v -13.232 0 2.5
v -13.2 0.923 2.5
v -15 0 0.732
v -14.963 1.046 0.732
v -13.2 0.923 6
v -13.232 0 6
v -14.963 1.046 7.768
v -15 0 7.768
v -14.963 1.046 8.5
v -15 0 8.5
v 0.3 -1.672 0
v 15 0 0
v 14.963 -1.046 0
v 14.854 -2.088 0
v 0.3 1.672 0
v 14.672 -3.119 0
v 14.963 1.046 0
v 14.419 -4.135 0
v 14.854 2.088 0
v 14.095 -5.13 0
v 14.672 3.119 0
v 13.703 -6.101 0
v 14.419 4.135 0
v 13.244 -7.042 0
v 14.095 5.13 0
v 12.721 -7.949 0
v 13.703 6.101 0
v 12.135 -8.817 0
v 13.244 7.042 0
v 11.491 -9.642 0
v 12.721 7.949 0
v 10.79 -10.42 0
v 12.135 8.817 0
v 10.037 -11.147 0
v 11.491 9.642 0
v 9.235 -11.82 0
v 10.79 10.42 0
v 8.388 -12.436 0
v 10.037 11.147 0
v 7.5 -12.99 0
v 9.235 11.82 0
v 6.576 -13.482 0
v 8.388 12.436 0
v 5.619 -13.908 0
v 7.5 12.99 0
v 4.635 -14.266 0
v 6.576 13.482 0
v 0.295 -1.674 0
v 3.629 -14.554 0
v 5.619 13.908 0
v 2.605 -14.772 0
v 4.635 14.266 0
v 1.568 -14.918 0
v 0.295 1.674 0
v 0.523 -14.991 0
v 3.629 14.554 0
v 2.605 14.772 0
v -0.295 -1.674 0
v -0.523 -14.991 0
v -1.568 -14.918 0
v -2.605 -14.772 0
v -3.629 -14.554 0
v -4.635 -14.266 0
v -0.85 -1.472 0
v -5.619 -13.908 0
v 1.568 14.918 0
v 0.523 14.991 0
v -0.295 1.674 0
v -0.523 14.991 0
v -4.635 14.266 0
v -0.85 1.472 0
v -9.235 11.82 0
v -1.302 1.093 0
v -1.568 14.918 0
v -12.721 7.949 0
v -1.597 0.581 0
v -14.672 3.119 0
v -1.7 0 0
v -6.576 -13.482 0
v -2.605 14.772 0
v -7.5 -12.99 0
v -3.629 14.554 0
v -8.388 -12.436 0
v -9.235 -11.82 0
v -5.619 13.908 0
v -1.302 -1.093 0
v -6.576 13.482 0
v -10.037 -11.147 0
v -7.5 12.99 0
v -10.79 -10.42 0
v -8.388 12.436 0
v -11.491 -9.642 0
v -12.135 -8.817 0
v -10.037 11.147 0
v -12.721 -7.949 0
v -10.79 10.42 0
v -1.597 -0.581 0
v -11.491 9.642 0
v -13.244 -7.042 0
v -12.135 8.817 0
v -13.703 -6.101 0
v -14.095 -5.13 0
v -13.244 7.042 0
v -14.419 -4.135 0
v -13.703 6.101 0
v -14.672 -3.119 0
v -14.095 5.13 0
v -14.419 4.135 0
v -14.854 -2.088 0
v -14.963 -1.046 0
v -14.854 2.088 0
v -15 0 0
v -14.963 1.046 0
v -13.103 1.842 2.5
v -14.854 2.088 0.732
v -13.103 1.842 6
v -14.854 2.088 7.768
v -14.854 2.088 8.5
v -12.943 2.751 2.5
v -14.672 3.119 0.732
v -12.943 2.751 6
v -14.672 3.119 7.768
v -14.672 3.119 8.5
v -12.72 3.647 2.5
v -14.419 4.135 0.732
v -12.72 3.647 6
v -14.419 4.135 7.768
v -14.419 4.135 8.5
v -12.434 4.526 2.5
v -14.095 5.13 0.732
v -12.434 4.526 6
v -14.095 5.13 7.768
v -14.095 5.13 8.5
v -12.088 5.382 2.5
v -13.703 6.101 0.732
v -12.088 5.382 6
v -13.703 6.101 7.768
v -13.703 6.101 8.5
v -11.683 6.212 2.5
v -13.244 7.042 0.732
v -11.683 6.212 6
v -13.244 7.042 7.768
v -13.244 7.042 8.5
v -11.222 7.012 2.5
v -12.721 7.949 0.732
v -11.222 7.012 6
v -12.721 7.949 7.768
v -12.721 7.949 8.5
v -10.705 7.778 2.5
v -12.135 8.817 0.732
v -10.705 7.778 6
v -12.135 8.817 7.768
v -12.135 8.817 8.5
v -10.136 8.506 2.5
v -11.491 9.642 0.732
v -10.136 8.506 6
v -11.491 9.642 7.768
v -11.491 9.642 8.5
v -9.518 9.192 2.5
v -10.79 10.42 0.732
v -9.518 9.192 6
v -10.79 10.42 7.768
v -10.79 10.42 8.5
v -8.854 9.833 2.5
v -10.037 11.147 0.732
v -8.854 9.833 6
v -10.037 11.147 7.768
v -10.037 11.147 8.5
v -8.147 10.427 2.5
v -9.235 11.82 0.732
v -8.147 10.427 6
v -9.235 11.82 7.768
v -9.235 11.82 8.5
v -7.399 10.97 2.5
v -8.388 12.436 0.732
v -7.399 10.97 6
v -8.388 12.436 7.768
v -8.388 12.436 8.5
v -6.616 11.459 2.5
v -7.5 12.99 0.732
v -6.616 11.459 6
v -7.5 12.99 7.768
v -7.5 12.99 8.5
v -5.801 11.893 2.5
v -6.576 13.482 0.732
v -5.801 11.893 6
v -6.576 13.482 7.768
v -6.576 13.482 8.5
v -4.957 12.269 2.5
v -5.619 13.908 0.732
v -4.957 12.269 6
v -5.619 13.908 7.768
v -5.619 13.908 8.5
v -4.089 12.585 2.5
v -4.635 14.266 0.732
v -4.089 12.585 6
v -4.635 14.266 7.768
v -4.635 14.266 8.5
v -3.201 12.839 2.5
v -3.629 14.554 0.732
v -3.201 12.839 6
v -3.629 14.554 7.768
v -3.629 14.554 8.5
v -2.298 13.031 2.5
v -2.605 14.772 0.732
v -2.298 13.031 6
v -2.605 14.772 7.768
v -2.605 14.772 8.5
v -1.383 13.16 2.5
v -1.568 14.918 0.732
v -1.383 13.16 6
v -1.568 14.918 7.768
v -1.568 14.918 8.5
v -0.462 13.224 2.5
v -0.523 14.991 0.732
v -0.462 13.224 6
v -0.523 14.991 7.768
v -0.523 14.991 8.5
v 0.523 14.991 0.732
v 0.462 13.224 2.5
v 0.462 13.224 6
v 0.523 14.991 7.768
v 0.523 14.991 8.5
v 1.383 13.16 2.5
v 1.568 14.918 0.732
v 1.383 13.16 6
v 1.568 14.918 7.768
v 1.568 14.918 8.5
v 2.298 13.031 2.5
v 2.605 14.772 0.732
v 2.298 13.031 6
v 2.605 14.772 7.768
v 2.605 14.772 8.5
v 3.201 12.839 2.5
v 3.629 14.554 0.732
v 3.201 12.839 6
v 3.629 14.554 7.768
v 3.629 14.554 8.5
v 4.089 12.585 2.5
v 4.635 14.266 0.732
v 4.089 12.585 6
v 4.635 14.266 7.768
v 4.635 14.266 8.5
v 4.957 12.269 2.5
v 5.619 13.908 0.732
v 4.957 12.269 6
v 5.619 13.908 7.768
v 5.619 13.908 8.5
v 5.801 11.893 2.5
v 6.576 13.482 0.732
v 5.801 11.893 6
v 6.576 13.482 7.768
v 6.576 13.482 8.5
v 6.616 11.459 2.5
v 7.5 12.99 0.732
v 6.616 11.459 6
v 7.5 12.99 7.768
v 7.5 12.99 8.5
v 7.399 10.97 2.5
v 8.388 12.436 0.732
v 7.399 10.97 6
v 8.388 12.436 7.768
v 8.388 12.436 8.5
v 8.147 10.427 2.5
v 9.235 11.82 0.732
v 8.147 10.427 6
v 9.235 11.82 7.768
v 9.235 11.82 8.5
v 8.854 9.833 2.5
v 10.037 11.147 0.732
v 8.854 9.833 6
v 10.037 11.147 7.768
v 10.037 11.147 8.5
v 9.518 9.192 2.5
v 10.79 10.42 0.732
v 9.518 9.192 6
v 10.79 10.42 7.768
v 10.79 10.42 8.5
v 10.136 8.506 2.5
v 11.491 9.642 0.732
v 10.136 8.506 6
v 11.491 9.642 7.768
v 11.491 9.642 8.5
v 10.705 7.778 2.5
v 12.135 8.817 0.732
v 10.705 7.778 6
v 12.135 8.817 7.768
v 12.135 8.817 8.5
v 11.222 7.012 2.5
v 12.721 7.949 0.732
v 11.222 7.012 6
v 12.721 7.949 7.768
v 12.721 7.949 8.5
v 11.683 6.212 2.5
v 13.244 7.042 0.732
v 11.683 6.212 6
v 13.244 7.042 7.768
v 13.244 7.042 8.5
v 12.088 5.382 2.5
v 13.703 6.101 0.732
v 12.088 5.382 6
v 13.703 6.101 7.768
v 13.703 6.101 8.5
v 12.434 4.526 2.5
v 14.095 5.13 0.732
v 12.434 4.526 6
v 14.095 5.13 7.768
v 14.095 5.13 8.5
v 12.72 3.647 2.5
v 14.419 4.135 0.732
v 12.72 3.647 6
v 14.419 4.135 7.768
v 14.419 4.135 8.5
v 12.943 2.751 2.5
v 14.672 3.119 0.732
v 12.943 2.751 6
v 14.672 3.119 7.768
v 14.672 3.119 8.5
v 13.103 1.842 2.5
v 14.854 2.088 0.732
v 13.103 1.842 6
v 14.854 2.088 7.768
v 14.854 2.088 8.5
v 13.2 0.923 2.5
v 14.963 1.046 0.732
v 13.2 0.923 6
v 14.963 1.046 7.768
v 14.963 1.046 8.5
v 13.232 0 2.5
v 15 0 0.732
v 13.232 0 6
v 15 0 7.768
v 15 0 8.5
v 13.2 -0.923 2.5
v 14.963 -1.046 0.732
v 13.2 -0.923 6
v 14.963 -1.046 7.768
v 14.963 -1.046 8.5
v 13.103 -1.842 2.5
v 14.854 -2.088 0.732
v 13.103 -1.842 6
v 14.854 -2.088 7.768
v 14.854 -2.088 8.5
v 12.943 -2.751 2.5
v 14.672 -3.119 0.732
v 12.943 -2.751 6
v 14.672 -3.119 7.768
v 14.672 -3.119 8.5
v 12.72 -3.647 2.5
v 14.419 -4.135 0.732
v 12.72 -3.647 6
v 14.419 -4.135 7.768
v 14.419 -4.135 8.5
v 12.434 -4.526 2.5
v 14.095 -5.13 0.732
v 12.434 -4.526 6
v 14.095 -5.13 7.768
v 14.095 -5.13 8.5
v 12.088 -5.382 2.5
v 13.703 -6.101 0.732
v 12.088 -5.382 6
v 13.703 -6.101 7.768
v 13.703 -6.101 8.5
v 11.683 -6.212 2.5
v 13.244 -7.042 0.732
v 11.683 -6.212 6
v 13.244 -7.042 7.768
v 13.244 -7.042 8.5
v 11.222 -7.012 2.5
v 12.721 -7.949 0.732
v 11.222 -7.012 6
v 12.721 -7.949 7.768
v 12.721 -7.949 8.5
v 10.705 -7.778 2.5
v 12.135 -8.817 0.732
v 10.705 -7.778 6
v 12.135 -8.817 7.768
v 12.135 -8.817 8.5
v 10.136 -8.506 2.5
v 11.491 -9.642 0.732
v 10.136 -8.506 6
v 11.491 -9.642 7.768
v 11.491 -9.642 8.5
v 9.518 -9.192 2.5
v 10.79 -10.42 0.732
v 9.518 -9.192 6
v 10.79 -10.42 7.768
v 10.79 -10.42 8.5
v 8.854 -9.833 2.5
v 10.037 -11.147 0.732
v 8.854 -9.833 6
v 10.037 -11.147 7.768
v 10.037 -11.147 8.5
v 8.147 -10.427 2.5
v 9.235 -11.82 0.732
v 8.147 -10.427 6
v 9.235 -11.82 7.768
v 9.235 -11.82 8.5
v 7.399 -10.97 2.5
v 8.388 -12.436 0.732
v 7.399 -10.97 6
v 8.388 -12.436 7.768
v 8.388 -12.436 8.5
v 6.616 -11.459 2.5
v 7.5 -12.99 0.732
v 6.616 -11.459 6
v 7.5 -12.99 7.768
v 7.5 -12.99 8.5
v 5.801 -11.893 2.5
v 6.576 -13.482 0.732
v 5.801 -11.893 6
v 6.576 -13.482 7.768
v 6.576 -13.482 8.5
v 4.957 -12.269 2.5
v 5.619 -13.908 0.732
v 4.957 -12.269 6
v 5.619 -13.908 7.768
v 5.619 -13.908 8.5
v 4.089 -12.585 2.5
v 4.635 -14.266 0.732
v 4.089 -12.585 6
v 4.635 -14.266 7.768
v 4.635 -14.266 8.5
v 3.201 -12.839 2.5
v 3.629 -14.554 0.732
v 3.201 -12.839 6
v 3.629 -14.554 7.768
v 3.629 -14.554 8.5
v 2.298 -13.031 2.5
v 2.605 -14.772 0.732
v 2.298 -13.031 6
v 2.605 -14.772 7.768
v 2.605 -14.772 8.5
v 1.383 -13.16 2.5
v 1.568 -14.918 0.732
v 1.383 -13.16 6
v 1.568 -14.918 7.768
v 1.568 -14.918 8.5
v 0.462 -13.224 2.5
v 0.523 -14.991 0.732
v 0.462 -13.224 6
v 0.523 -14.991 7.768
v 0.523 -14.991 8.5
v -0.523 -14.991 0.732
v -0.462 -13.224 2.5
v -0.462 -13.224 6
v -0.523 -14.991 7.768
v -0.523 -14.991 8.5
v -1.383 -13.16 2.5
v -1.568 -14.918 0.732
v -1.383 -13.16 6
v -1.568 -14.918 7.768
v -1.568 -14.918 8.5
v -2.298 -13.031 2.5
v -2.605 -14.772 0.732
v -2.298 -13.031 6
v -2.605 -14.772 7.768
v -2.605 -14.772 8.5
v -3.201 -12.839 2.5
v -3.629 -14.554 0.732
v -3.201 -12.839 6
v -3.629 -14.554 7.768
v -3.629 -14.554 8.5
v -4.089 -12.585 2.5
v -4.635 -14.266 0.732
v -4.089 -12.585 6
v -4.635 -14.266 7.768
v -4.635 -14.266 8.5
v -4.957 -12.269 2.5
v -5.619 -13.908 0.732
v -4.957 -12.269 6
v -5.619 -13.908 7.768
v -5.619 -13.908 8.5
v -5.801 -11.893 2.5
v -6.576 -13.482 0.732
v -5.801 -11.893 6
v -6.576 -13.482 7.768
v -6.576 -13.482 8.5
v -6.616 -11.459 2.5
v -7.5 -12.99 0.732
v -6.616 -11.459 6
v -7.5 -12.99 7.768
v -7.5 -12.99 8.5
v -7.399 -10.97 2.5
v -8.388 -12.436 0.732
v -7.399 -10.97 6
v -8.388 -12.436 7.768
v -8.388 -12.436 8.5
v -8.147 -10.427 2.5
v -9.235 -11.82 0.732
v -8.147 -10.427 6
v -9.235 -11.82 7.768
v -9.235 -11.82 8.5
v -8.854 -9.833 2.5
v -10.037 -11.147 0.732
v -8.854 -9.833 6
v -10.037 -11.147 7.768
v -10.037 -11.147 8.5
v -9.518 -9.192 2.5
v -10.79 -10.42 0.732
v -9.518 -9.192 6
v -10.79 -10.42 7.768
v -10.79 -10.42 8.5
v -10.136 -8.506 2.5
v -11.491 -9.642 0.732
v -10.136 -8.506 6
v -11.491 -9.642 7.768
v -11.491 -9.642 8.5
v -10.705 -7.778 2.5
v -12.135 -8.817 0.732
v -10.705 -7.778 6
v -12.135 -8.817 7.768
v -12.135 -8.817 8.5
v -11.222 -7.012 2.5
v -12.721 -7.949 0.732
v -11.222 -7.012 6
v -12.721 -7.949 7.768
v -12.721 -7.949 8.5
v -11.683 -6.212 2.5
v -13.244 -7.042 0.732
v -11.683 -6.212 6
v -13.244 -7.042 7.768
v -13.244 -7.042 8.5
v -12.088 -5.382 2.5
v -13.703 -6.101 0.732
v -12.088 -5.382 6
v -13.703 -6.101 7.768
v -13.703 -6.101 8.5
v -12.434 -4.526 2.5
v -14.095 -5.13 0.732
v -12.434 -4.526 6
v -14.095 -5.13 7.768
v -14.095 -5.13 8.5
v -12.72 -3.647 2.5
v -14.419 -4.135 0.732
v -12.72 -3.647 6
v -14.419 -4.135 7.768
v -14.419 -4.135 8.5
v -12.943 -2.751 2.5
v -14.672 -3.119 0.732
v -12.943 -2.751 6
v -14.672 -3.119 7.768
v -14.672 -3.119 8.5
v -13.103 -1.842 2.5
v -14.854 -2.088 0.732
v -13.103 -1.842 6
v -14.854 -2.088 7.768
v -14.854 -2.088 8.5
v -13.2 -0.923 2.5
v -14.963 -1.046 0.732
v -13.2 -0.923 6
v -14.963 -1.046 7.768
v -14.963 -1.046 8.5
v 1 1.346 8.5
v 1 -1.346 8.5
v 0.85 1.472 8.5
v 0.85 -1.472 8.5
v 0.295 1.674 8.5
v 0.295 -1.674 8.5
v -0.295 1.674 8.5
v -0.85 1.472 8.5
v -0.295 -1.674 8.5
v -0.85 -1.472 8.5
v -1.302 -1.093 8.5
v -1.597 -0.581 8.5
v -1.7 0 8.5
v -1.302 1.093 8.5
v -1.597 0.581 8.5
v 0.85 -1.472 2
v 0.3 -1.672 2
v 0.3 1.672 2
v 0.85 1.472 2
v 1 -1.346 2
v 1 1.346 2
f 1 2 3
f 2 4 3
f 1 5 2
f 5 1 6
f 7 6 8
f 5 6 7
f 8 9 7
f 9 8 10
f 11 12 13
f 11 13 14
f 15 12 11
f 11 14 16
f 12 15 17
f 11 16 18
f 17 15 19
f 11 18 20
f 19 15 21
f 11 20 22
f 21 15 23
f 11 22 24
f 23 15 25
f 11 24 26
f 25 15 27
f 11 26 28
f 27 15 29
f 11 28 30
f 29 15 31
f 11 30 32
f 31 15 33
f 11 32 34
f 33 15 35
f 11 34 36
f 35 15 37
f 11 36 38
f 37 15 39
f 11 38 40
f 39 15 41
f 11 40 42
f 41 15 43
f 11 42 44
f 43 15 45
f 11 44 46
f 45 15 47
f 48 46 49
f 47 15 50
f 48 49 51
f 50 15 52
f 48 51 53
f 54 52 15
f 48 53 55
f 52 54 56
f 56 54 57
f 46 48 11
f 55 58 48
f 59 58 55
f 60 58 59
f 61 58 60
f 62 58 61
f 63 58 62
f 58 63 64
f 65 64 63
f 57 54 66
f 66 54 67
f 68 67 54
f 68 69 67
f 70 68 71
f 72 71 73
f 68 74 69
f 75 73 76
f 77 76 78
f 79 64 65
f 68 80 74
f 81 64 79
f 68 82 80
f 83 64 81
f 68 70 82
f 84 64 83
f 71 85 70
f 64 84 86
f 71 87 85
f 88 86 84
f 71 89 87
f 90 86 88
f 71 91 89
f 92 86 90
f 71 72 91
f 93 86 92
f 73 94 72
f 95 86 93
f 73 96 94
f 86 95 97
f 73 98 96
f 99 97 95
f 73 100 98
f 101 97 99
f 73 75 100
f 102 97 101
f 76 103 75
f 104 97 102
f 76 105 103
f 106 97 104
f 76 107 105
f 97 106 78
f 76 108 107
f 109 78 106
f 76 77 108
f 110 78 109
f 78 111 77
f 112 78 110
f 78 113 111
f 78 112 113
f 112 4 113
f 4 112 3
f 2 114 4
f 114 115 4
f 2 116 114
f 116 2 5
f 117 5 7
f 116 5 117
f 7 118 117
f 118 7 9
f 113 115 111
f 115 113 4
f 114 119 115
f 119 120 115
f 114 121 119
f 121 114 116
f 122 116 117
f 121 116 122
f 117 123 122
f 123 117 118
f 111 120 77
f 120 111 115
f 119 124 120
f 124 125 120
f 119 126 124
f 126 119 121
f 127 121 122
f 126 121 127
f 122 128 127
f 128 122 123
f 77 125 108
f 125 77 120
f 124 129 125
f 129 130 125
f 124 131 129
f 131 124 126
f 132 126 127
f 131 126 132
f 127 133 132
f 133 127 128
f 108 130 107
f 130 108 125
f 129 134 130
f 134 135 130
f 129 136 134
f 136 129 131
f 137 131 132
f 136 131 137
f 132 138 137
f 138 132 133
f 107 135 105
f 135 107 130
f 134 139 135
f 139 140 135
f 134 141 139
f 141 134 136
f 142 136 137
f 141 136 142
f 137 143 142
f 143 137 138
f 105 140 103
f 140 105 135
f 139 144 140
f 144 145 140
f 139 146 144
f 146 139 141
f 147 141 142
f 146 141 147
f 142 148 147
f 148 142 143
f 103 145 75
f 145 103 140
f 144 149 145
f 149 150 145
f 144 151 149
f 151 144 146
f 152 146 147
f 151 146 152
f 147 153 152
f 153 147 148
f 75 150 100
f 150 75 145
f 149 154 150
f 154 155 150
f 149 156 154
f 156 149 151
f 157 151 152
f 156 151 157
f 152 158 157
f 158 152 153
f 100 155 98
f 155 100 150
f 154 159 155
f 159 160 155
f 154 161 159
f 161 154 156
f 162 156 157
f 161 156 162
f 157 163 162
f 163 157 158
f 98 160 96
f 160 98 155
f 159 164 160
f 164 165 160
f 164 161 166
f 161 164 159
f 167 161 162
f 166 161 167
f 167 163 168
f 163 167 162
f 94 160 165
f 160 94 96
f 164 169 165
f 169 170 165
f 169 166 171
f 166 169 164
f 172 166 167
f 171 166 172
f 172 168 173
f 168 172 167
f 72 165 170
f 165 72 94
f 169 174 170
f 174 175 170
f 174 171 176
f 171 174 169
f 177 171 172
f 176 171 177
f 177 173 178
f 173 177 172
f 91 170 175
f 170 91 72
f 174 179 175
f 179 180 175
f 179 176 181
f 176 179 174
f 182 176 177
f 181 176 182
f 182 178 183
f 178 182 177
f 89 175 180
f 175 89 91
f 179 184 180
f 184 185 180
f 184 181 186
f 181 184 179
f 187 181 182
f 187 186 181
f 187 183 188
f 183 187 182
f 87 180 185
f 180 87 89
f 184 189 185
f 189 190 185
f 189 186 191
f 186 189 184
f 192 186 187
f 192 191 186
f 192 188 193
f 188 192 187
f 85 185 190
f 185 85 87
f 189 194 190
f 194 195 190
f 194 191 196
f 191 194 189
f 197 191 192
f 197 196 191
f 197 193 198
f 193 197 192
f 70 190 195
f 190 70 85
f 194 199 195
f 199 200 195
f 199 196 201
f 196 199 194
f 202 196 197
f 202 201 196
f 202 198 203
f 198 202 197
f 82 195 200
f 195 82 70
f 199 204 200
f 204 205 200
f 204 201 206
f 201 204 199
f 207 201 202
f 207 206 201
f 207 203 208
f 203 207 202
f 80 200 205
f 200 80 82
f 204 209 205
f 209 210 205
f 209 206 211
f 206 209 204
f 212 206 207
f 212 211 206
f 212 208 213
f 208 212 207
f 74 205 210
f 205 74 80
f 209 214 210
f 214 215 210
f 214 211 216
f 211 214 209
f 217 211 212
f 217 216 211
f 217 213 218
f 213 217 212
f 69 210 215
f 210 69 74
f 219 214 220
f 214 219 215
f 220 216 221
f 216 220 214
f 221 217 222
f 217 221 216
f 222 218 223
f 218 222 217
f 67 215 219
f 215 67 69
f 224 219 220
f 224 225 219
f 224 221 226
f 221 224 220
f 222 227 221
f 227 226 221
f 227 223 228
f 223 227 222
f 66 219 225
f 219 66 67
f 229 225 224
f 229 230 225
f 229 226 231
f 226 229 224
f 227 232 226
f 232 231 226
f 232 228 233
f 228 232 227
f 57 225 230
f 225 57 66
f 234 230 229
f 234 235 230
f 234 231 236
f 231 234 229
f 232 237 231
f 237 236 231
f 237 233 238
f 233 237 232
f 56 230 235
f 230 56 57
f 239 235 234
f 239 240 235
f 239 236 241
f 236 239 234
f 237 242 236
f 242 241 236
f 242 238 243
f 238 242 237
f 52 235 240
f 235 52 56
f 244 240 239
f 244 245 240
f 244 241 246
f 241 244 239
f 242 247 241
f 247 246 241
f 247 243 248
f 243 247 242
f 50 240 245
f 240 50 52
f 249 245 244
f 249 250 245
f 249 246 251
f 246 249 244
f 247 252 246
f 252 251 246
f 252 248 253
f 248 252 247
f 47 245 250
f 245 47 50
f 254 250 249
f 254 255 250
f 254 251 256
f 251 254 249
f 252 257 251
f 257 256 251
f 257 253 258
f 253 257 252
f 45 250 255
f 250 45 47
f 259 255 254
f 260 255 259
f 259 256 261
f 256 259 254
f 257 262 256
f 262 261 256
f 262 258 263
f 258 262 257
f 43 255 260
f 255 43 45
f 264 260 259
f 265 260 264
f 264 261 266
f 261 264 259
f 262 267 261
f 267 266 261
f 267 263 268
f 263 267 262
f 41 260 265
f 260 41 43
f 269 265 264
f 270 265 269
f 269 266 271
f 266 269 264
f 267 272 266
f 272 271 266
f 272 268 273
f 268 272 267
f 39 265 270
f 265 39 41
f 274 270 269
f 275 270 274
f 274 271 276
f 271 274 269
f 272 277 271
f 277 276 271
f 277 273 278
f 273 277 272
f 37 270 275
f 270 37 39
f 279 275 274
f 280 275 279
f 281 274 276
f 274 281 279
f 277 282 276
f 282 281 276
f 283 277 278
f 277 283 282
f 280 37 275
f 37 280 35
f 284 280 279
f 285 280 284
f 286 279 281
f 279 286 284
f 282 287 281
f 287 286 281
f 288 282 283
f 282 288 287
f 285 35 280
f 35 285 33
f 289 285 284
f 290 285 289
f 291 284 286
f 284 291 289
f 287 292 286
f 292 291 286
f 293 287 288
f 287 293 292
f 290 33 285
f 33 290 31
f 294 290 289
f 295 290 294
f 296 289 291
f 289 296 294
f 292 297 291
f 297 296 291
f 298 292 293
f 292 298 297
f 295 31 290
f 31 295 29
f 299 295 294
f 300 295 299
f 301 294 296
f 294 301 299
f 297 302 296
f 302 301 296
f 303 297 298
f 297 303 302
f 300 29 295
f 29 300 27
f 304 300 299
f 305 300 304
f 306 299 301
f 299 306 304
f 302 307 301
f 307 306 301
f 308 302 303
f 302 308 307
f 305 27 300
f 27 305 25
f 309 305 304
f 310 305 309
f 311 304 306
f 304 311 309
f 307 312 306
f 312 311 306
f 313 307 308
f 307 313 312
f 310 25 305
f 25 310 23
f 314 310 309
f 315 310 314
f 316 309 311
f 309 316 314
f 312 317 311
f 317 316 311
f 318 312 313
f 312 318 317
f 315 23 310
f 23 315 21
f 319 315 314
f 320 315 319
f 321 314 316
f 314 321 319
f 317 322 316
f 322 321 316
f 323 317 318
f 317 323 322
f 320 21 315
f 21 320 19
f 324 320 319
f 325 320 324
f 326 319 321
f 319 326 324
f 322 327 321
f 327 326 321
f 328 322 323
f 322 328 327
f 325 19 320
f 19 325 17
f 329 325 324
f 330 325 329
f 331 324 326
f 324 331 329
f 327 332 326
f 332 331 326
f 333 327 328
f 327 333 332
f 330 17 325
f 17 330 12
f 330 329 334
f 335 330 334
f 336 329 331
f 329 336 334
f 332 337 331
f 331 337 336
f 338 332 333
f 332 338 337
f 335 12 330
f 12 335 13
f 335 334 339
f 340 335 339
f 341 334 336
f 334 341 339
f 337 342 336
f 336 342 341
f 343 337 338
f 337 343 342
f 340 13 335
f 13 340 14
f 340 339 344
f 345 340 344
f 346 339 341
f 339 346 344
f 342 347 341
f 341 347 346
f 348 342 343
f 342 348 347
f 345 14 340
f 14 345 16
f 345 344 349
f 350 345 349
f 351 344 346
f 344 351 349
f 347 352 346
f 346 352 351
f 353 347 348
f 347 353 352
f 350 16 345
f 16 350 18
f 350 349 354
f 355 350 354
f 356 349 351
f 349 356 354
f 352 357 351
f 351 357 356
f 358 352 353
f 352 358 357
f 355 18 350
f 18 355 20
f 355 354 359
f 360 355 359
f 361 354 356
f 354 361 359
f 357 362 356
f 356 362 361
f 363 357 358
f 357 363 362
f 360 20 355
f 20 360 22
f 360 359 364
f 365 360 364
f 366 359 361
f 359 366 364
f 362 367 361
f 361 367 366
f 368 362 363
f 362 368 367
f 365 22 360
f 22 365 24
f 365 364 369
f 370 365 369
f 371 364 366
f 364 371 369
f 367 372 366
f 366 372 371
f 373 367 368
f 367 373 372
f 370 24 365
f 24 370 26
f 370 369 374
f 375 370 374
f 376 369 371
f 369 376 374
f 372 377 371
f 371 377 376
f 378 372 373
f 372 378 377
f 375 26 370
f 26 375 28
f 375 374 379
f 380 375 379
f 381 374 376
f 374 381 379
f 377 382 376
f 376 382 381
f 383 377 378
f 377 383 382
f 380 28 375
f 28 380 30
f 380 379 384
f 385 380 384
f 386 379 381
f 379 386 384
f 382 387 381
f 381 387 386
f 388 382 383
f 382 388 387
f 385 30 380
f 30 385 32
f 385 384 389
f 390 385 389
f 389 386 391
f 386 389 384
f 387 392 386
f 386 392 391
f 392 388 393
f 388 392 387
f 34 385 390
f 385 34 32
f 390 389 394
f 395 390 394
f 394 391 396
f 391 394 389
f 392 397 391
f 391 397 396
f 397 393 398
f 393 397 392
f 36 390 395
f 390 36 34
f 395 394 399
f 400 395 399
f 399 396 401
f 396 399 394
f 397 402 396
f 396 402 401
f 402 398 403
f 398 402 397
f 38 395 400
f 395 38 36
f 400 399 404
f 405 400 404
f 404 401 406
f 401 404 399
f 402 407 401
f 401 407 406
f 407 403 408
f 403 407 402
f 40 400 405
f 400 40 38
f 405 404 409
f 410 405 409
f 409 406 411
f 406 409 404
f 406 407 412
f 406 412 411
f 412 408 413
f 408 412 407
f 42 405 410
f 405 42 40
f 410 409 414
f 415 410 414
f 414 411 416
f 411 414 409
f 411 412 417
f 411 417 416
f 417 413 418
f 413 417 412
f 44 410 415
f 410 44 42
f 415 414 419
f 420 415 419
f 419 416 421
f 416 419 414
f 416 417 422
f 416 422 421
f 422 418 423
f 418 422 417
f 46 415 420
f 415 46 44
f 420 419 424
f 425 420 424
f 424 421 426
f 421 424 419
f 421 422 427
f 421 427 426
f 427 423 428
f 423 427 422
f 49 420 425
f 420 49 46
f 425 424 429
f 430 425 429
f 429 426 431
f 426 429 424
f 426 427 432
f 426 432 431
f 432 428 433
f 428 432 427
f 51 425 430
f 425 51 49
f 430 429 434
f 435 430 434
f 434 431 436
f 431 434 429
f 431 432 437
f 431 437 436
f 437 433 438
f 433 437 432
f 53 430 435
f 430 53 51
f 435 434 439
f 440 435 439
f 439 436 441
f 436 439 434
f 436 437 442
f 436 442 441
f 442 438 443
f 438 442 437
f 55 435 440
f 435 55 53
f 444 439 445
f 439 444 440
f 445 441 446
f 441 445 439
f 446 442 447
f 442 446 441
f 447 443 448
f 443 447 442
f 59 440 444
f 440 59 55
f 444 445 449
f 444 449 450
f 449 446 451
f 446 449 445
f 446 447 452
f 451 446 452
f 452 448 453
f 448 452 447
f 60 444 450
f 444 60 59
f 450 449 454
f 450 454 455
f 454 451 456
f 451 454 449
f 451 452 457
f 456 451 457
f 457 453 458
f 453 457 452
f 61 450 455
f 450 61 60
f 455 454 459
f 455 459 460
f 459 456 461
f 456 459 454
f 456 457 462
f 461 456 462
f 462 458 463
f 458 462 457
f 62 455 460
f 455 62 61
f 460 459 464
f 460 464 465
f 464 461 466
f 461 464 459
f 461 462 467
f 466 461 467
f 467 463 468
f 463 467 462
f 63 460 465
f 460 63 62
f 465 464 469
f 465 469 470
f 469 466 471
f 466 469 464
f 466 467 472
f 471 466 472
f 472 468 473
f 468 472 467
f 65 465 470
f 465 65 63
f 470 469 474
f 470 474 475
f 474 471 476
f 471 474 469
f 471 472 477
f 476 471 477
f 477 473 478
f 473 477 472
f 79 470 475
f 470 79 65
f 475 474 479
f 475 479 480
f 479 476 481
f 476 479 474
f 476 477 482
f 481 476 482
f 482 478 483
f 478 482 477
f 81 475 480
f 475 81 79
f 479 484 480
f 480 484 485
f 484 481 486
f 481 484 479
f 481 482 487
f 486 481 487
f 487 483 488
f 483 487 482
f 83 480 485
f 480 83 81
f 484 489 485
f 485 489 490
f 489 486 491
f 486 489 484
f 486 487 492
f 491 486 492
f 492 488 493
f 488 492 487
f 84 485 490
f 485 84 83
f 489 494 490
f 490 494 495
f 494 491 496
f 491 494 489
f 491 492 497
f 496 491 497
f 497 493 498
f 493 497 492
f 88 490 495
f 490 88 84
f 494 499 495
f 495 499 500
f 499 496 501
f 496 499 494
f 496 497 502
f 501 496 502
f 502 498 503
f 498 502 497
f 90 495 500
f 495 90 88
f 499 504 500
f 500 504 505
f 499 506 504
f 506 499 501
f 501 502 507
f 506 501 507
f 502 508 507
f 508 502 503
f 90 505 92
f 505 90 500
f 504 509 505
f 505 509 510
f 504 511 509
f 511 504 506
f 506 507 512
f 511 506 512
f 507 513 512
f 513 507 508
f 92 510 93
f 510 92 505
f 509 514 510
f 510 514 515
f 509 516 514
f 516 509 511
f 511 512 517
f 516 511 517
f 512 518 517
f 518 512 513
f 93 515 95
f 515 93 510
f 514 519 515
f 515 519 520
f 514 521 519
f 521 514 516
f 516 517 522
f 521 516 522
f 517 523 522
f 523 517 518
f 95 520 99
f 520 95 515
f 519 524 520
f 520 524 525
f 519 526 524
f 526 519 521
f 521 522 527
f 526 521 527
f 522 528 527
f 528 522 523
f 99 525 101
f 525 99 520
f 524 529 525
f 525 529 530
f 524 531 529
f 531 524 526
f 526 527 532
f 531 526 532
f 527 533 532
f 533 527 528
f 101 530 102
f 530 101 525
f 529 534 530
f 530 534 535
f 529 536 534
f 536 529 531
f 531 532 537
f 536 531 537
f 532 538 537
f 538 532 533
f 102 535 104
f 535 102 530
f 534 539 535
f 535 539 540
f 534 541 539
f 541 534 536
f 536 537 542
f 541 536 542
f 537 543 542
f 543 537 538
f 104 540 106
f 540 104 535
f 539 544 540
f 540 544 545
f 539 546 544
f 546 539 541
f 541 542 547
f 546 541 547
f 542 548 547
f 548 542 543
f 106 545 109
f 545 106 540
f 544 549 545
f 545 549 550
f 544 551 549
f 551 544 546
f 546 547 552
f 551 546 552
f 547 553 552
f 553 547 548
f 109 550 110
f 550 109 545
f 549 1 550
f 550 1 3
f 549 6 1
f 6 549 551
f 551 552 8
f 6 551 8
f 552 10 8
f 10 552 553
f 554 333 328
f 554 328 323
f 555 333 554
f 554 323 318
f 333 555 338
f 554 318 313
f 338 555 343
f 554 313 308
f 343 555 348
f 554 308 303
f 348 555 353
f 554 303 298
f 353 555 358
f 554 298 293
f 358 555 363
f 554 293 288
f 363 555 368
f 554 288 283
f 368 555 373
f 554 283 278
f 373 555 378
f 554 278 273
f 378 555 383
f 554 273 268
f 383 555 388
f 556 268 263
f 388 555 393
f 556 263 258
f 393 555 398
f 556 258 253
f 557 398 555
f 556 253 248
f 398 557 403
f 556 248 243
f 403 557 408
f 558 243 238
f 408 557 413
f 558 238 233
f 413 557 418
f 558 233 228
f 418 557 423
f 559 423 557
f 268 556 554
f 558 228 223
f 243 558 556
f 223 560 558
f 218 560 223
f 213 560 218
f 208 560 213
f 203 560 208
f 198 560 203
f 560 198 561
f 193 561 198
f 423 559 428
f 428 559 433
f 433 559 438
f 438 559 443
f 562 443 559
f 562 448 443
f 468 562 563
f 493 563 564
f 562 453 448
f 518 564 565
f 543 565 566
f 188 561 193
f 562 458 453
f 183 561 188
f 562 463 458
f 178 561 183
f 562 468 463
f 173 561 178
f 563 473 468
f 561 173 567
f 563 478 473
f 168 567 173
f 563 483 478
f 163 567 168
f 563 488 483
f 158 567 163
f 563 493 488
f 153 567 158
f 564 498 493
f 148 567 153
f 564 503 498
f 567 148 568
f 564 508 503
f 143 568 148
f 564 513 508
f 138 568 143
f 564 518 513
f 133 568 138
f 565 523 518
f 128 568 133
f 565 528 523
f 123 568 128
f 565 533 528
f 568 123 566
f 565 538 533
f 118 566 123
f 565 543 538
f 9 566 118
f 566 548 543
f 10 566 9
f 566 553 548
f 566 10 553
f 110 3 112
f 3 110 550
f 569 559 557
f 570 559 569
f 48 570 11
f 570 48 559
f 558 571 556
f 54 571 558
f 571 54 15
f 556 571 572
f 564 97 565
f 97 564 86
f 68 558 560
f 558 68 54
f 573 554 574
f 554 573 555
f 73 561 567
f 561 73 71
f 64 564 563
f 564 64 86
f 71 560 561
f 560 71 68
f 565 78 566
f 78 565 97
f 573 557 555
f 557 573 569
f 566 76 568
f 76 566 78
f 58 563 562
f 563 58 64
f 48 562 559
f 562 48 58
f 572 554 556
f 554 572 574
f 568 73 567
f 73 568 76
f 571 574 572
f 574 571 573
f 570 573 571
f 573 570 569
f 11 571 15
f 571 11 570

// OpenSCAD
// file: inc/bevel_lib.scad
// Bevelled boxes, etc
module roundedbox(size=[1.0, 1.0, 1.0, ], radius = 0.1) {
    hull() {
        for (x = [radius, size[0] - radius]) {
            for (y = [radius, size[1] - radius]) {
                for (z = [radius, size[2] - radius]) {
                    translate([x,y,z])
                        sphere(r=radius);
                }
            }
        }
    }
}

module rounded_square_centered(size=[1,1], radius=0.1) {
    hull() {
        for (x = [- size[0] / 2 + radius, size[0] / 2 - radius]) {
            for (y = [- size[1] / 2 + radius, size[1] / 2 - radius]) {
                translate([x,y]) circle(radius);
            }
        }
    }
}

// Bevelled in x and y axes.
module bevelledbox(size=[1,1,1], radius=0.1) {
    linear_extrude(height=size[2]) {
        // 8-sided polygon
        polygon(points=[
            // Left
            [0, radius ],
            [0, size[1] - radius ],
            // Top
            [radius, size[1]],
            [size[0] - radius, size[1]],
            // Right
            [size[0], size[1] - radius],
            [size[0], radius],
            // Bot
            [size[0] -radius, 0],
            [radius, 0]
            ]);
    }
}

module bevelledbox_y(size=[1,1,1], radius=0.1) {
    // Bevelled around y
    translate([0,0,size[2]])
        rotate(-90, [1,0,0])
            bevelledbox([size[0], size[2], size[1]], radius); 
}

module bevelledbox_x(size=[1,1,1], radius=0.1) {
    // Bevelled around x
    translate([size[0],0,0])
        rotate(-90, [0,1,0])
            bevelledbox([size[2], size[1], size[0]], radius); 
}

// Draw origin-centred, unit polyhedron.
module octahedron(C0=1.0) {
    polyhedron(points = [
        [0.0, 0.0,  C0],
        [0.0, 0.0, -C0],
        [ C0, 0.0, 0.0],
        [-C0, 0.0, 0.0],
        [0.0,  C0, 0.0],
        [0.0, -C0, 0.0]
        ],
        faces = [
[ 4 , 2, 0],
[ 3 , 4, 0],
[ 5 , 3, 0],
[ 2 , 5, 0],
[ 5 , 2, 1],
[ 3 , 5, 1],
[ 4 , 3, 1],
[ 2 , 4, 1]
        ]
    );
}

module fullybevelledbox(size=[1,1,1], radius=0.1) {
    hull() {
        for (x = [radius, size[0] - radius]) {
            for (y = [radius, size[1] - radius]) {
                for (z = [radius, size[2] - radius]) {
                    translate([x,y,z])
                        octahedron(radius);
                }
            }
        }
    }
}
// main file
// This document uses MILLIMETRES as a unit.

// Set $fs (smallest arc fragment) to lower value than default 2.0
$fs = 0.6; // millimetres
$fa = 4;
use <inc/bevel_lib.scad>;

// Gearbox is approx 15x10 mm, so needs about 18mm inside
main_diameter = 30;

main_radius = main_diameter / 2;

axle_diameter = 3.0;
axle_radius = axle_diameter / 2;
axle_radius_margin = 0.2; // Extra allowance for shrinkage etc
main_height = 8.5;
tyre_radius = 2.5;
tyre_offset = 2.5; // tyre distance from end

// Unit-diamond 
module diamond(r=1.0)
{
    polygon(points=[ [r,0], [0,r], [-r,0], [0,-r] ]);
}

module bevel_square(size=[10,10], r=1.0)
{
    hull() {
        translate([r,r]) diamond(r);
        translate(size - [r,r]) diamond(r);
        translate([size[0] - r, r]) diamond(r);
        translate([r, size[1] - r]) diamond(r);
    }
}

module wheel_simple() 
{
    difference()
    {
        union()
        {
            // Outer part
            rotate_extrude(convexity=3) {
                difference() {
                    
                    union() {
                        // Walls
                            square([main_radius, main_height]);
                    };
                    // Tyre cutout
                    translate([main_radius - (tyre_radius / sqrt(2)),0])
                    {
                        bevel_square([tyre_radius * 2, main_height],
                            r=tyre_radius);
                    }
                }
            }
        }
        
        // Cutouts
        union() 
        {
            // Cutout for axle
            translate([0,0,-10]) {
                linear_extrude(height=30.0, convexity=3) {
                    intersection() {
                        circle(r=axle_radius + axle_radius_margin);
                        flat_width = 0.7; // flat side width
                        translate([- flat_width,0,0]) {
                            side = (axle_radius + axle_radius_margin) * 2;
                            square([side, side], center=true);
                        }
                    }
                } // linear
            } // trans
        } // union
    } // difference
    // This piece mates with the shaft cutout.
    translate([0.8,0,1])
        cube([1,5,2], center=true);
}

wheel_simple();
